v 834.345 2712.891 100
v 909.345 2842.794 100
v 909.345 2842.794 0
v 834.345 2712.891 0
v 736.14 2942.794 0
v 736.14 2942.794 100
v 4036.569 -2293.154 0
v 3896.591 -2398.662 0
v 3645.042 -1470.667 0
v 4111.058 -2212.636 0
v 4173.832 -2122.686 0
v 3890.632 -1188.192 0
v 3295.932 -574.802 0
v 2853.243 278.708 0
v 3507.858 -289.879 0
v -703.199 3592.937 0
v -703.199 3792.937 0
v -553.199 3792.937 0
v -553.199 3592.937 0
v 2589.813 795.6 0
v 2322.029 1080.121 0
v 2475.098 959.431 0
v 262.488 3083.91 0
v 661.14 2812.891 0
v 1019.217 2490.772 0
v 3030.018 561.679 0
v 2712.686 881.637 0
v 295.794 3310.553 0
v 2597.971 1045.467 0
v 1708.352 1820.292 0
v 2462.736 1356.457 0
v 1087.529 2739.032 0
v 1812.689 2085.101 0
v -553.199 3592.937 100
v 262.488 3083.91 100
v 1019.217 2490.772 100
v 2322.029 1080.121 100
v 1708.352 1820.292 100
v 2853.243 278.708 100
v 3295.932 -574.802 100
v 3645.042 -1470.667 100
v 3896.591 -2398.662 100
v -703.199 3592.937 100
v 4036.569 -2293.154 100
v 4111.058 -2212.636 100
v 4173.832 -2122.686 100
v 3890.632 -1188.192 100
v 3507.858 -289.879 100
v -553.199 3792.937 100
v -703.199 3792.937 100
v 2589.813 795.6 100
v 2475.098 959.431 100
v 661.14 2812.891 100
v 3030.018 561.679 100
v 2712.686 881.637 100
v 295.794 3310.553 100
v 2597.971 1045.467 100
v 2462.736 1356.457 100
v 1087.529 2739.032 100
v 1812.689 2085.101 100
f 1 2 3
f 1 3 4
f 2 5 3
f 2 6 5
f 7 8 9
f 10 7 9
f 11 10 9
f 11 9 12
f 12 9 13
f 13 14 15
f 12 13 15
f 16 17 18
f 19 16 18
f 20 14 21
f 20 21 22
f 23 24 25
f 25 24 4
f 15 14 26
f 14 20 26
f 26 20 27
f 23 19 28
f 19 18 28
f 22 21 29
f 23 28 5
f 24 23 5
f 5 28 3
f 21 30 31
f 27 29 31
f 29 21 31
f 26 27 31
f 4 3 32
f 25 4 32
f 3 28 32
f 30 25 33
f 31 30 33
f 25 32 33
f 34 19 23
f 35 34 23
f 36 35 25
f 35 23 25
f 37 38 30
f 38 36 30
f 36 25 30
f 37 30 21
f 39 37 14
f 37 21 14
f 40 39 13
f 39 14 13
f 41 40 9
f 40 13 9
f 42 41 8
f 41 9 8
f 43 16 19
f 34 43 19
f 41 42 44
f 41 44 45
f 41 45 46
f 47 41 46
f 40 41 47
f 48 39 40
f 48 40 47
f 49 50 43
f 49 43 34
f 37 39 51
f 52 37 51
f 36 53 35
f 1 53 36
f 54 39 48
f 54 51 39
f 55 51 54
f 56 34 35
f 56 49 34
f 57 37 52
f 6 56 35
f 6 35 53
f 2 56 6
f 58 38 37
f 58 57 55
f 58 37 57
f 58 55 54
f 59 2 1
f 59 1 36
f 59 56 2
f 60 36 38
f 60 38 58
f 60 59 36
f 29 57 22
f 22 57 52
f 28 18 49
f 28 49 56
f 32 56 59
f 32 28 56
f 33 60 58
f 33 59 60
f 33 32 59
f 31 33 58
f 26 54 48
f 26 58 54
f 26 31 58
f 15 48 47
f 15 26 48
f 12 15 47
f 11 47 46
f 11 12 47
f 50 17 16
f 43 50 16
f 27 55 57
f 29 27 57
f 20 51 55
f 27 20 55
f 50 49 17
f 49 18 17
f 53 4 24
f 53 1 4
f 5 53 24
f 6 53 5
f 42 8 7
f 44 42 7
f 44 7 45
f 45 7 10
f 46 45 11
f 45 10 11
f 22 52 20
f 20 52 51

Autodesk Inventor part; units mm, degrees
ref_plane "YZ Plane" through (0, 0, 0) normal (1, 0, 0) x (0, 1, 0)
ref_plane "XZ Plane" through (0, 0, 0) normal (0, 1, 0) x (-1, 0, 0)
ref_plane "XY Plane" through (0, 0, 0) normal (0, 0, 1) x (1, 0, 0)
sketch "Sketch1" plane through (0, 0, 0) normal (0, 0, 1) x (1, 0, 0)
  ellipse E0 centre (3487.9501, -1710.9027) end of major axis (3487.9501, -2510.9027) minor radius 800 (3896.5911, -2398.6618) -> (4173.8323, -2122.6862) ccw
  arc A0 (4173.8323, -2122.6862) -> (-553.1987, 3792.9367) centre (-4568.2524, -4261.8348) ccw
  arc A1 (3896.5911, -2398.6618) -> (-553.1987, 3592.9367) centre (-4903.3075, -4285.9308) ccw
  line L0 (-553.1987, 3792.9367) -> (-703.1987, 3792.9367)
  line L1 (-703.1987, 3792.9367) -> (-703.1987, 3592.9367)
  line L2 (-703.1987, 3592.9367) -> (-553.1987, 3592.9367)
  point P0 (0, 0)
  point P1 (3896.5911, -2398.6618)
  point P2 (4173.8323, -2122.6862)
  dimension "d0" = 9000
  dimension "d1" = 9000
  dimension "d2" = 150
extrude "Extrusion1" add sketch "Sketch1" along normal blind 100
sketch "Sketch2" plane through (0, 0, 100) normal (0, 0, 1) x (1, 0, 0)
  line L0 (2475.0978, 959.4308) -> (2589.8131, 795.6004)
  line L1 (2589.8131, 795.6004) -> (2712.6859, 881.6369)
  line L2 (2712.6859, 881.6369) -> (2597.9706, 1045.4673)
  line L3 (2597.9706, 1045.4673) -> (2475.0978, 959.4308)
  line L4 (2475.0978, 959.4308) -> (2712.6859, 881.6369) construction
  line L5 (2589.8131, 795.6004) -> (2597.9706, 1045.4673) construction
  line L6 (2475.0978, 959.4308) -> (2675.0978, 959.4308) construction
  line L7 (736.1399, 2942.7945) -> (909.345, 2842.7945)
  line L8 (909.345, 2842.7945) -> (834.345, 2712.8907)
  line L9 (834.345, 2712.8907) -> (661.1399, 2812.8907)
  line L10 (661.1399, 2812.8907) -> (736.1399, 2942.7945)
  line L11 (736.1399, 2942.7945) -> (834.345, 2712.8907) construction
  line L12 (909.345, 2842.7945) -> (661.1399, 2812.8907) construction
  line L13 (736.1399, 2942.7945) -> (936.1399, 2942.7945) construction
  point P0 (0, 0)
  point P1 (2593.8918, 920.5338)
  point P2 (785.2424, 2827.8426)
  dimension "d8" = 200
  dimension "d9" = 55
  dimension "d10" = 150
  dimension "d13" = 200
  dimension "d14" = 30
  dimension "d15" = 150
extrude "Extrusion3" cut sketch "Sketch2" against normal through all
properties part number "curve_beam_02" material "Wood (Maple)"
